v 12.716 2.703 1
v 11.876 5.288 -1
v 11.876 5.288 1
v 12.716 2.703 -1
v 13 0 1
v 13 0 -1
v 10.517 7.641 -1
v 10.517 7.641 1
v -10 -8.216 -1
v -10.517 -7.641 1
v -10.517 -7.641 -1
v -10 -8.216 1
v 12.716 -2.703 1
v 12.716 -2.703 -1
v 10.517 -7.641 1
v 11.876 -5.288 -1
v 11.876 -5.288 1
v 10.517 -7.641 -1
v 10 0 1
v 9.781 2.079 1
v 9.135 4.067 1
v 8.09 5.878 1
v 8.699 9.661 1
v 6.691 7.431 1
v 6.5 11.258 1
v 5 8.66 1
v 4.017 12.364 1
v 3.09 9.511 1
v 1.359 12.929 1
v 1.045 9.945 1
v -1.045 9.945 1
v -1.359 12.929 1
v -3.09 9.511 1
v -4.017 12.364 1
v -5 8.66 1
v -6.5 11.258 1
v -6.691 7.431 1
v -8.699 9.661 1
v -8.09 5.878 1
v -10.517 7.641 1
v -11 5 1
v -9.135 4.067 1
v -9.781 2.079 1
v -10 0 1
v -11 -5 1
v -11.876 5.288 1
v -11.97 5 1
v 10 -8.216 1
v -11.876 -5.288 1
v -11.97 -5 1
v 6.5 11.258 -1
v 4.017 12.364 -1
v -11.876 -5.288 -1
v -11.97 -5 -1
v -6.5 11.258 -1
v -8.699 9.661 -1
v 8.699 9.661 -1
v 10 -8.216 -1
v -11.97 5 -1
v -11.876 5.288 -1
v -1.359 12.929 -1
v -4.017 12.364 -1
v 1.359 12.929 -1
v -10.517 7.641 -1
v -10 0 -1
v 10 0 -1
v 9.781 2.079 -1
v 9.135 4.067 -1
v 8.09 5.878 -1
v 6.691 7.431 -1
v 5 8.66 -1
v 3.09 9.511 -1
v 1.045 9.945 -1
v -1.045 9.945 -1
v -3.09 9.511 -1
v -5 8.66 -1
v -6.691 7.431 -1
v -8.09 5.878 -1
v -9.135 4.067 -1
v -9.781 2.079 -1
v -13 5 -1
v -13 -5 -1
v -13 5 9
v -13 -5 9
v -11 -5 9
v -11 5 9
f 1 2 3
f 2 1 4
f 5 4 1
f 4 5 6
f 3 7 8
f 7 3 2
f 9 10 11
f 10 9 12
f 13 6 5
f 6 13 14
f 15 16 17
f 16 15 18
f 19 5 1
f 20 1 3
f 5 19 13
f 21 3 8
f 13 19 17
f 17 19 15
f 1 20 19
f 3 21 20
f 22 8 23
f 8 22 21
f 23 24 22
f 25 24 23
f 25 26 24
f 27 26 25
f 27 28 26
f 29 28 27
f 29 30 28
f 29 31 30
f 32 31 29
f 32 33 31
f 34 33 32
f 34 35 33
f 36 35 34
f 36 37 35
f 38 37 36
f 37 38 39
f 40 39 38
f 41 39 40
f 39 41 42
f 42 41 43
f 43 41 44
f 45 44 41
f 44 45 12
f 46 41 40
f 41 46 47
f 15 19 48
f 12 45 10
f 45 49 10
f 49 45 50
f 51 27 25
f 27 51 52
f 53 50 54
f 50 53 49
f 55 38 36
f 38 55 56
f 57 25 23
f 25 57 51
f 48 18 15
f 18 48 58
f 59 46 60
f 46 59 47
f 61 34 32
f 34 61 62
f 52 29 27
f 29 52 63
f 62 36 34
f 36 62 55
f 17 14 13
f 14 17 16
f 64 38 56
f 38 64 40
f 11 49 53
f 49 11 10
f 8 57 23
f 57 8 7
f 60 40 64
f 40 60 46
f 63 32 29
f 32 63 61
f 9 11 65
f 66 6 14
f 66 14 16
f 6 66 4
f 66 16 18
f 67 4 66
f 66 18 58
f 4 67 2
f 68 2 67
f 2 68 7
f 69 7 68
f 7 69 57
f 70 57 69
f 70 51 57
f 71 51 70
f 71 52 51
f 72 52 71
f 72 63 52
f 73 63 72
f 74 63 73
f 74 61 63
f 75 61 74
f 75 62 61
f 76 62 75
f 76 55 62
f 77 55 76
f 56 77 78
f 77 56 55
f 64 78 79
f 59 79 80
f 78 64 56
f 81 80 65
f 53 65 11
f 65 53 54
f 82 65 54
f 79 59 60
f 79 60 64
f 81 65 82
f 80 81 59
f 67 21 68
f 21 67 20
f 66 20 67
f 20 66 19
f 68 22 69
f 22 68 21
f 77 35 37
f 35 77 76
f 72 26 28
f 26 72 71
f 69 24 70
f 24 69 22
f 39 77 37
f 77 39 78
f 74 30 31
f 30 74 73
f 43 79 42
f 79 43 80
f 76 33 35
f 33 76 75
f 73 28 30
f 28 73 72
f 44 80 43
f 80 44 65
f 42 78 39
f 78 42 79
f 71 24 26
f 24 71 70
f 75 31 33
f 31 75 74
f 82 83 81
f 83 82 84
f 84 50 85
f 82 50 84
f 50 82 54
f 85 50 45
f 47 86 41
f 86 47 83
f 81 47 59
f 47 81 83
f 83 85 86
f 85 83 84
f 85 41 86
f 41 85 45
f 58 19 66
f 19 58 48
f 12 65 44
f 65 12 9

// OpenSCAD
// A kitchen hook thingie
// by Cristian Sandu

hook_dia = 20; // mm
hook_width = 2;
hook_depth = 3;

module hook() {
  difference() {
    cylinder(r = hook_dia / 2 + hook_depth, h = hook_width, center=true);
    cylinder(r = hook_dia / 2, h = hook_width + hook_depth , center=true);
  }
}

module base() {
   translate([-hook_dia / 2 - hook_depth / 1.5, 0, hook_width * 2]) {
    rotate([90, 0, 0]) {
      cube(size=[hook_width, hook_dia / 2, hook_width * 5], center=true);
    }
  }
}

difference() {
  union() {
    base();
    hook();
  }

  translate([0, -hook_dia / 2, 0]) {
    cube(size=[hook_dia, hook_dia, hook_width * 2], center=true);
  }
}
